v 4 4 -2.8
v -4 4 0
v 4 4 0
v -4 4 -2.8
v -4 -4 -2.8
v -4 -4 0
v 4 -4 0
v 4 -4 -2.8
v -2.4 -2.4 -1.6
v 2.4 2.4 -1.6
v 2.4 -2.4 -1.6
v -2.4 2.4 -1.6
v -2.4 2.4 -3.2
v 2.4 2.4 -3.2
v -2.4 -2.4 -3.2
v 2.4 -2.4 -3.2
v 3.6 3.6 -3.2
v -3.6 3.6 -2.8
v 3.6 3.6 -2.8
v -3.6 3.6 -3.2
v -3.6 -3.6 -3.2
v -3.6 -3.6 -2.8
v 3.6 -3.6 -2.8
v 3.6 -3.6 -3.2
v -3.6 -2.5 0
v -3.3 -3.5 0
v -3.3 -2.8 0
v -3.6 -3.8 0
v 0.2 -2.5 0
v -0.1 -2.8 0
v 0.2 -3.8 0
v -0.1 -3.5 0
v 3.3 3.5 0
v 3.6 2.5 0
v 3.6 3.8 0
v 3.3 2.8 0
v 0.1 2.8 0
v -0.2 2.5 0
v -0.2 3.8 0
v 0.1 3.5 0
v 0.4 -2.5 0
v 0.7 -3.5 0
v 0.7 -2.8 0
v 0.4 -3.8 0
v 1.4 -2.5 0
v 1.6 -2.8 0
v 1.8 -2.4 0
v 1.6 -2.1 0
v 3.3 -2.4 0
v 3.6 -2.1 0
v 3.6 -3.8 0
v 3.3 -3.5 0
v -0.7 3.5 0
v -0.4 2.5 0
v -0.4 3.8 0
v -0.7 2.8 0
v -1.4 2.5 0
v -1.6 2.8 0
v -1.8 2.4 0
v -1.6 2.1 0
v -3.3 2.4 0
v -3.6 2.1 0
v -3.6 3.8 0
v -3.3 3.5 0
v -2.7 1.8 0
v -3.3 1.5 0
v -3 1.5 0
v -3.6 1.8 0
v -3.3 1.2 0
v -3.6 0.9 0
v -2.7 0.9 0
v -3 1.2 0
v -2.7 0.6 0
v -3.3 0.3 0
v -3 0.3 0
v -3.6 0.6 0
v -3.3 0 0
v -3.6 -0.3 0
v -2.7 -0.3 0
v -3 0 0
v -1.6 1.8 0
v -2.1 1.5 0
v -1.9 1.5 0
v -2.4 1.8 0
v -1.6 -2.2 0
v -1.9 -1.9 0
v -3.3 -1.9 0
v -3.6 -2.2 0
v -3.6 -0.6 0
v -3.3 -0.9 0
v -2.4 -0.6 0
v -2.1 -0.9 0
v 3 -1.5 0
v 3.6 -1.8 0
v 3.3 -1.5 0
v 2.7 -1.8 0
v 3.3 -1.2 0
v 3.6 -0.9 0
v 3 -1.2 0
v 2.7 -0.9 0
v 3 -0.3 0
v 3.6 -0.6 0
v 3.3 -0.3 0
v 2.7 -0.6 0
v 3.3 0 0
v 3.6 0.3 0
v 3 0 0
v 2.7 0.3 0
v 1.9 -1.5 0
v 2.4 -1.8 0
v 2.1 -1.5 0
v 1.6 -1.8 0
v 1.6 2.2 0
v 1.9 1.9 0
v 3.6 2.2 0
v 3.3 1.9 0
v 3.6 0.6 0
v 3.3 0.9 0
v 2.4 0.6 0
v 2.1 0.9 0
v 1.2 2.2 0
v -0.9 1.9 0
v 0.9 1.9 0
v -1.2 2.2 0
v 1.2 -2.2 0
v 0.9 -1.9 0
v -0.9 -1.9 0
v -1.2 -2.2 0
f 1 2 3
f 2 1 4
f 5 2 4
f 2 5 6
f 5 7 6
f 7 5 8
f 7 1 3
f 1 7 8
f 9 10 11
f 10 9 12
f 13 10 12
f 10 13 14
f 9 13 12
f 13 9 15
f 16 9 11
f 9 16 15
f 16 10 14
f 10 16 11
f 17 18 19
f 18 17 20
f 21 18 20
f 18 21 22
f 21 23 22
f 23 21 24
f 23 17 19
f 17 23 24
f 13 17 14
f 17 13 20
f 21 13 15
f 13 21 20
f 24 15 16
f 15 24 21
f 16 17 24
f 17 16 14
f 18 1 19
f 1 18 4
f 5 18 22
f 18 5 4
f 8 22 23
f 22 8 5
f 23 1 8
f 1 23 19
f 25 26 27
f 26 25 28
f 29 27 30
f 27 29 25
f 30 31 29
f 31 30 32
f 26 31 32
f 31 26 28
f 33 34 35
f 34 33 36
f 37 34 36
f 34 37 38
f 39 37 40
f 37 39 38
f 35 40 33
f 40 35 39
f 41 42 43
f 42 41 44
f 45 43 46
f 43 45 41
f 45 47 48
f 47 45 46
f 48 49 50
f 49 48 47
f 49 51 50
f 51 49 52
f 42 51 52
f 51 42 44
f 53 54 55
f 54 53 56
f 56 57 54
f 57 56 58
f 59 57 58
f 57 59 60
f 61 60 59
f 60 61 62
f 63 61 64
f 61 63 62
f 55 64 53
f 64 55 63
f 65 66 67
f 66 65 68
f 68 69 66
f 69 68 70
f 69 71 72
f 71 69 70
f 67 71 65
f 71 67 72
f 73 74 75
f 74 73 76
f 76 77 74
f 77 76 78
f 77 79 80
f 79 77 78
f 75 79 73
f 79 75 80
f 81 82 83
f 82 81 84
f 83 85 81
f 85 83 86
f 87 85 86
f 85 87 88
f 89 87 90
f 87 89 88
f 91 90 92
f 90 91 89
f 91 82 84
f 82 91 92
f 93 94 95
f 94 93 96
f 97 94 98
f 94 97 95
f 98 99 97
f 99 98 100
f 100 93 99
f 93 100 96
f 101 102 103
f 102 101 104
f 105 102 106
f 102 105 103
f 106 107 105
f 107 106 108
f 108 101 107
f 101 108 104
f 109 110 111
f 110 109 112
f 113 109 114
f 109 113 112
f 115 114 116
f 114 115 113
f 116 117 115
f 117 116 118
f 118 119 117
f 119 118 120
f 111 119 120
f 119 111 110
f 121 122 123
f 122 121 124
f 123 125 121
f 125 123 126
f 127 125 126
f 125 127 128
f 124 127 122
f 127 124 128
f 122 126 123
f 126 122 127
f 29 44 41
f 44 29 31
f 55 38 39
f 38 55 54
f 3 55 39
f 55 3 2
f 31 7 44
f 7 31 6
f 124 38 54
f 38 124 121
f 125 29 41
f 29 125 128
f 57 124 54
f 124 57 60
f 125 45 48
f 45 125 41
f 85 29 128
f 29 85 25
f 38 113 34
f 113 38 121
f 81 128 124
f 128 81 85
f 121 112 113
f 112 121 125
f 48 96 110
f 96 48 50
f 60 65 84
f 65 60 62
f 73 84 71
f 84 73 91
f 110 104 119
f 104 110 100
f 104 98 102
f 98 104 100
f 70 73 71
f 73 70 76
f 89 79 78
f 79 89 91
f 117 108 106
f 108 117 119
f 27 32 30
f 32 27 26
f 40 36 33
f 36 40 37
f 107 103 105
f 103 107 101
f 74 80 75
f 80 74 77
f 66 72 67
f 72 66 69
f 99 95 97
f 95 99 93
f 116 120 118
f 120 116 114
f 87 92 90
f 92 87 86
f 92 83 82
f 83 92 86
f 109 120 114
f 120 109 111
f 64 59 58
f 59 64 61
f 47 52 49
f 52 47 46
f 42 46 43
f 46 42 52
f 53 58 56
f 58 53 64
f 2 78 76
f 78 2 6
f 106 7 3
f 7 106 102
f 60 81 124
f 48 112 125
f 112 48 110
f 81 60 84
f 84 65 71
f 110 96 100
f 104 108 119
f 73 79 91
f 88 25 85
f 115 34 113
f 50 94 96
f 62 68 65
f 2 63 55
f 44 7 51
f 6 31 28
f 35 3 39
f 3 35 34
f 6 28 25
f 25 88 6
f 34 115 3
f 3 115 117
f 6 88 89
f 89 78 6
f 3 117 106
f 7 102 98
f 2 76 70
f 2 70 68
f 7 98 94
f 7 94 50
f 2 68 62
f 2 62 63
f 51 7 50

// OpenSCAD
// file: ../p/box5.scad
use <../lib.scad>
function ldraw_lib__box5() = [
// 0 Box with 5 Faces and All Edges
// 0 Name: box5.dat
// 0 Author: James Jessiman
// 0 !LDRAW_ORG Primitive UPDATE 2012-01
// 0 !LICENSE Licensed under CC BY 4.0 : see CAreadme.txt
// 
// 0 BFC CERTIFY CCW
  [0,"BFC","CERTIFY"],
  [0,"BFC","CCW"],
// 
// 0 !HISTORY 2002-04-03 [sbliss] Modified for BFC compliance
// 0 !HISTORY 2002-04-25 [PTadmin] Official Update 2002-02
// 0 !HISTORY 2007-06-24 [PTadmin] Header formatted for Contributor Agreement
// 0 !HISTORY 2008-07-01 [PTadmin] Official Update 2008-01
// 0 !HISTORY 2012-02-16 [Philo] Changed to CCW
// 0 !HISTORY 2012-03-30 [PTadmin] Official Update 2012-01
// 
// 
// 2 24 1 1 1 -1 1 1
  [2,24,1,1,1,-1,1,1],
// 2 24 -1 1 1 -1 1 -1
  [2,24,-1,1,1,-1,1,-1],
// 2 24 -1 1 -1 1 1 -1
  [2,24,-1,1,-1,1,1,-1],
// 2 24 1 1 -1 1 1 1
  [2,24,1,1,-1,1,1,1],
// 2 24 1 0 1 -1 0 1
  [2,24,1,0,1,-1,0,1],
// 2 24 -1 0 1 -1 0 -1
  [2,24,-1,0,1,-1,0,-1],
// 2 24 -1 0 -1 1 0 -1
  [2,24,-1,0,-1,1,0,-1],
// 2 24 1 0 -1 1 0 1
  [2,24,1,0,-1,1,0,1],
// 2 24 1 0 1 1 1 1
  [2,24,1,0,1,1,1,1],
// 2 24 -1 0 1 -1 1 1
  [2,24,-1,0,1,-1,1,1],
// 2 24 1 0 -1 1 1 -1
  [2,24,1,0,-1,1,1,-1],
// 2 24 -1 0 -1 -1 1 -1
  [2,24,-1,0,-1,-1,1,-1],
// 4 16 -1 1 1 1 1 1 1 1 -1 -1 1 -1
  [4,16,-1,1,1,1,1,1,1,1,-1,-1,1,-1],
// 4 16 -1 1 1 -1 0 1 1 0 1 1 1 1
  [4,16,-1,1,1,-1,0,1,1,0,1,1,1,1],
// 4 16 -1 1 -1 -1 0 -1 -1 0 1 -1 1 1
  [4,16,-1,1,-1,-1,0,-1,-1,0,1,-1,1,1],
// 4 16 1 1 -1 1 0 -1 -1 0 -1 -1 1 -1
  [4,16,1,1,-1,1,0,-1,-1,0,-1,-1,1,-1],
// 4 16 1 1 1 1 0 1 1 0 -1 1 1 -1
  [4,16,1,1,1,1,0,1,1,0,-1,1,1,-1],
];
module ldraw_lib__box5(step=0, col=false, unit=2/5, alt=false, line=0.2, solid=!$preview)
    makepoly(ldraw_lib__box5(), step=step, col=col, unit=unit, alt=alt, line=line, solid=solid);
ldraw_lib__box5(line=0.2);
// file: ../p/box4.scad
use <../lib.scad>
function ldraw_lib__box4() = [
// 0 Box with 4 Faces (2 Parallel Pairs) and All Edges
// 0 Name: box4.dat
// 0 Author: James Jessiman
// 0 !LDRAW_ORG Primitive UPDATE 2012-01
// 0 !LICENSE Licensed under CC BY 4.0 : see CAreadme.txt
// 
// 0 BFC CERTIFY CCW
  [0,"BFC","CERTIFY"],
  [0,"BFC","CCW"],
// 
// 0 !HISTORY 2002-04-03 [sbliss] Modified for BFC compliance
// 0 !HISTORY 2002-04-25 [PTadmin] Official Update 2002-02
// 0 !HISTORY 2007-06-24 [PTadmin] Header formatted for Contributor Agreement
// 0 !HISTORY 2008-07-01 [PTadmin] Official Update 2008-01
// 0 !HISTORY 2012-02-16 [Philo] Changed to CCW
// 0 !HISTORY 2012-03-30 [PTadmin] Official Update 2012-01
// 
// 
// 2 24 1 1 1 -1 1 1
  [2,24,1,1,1,-1,1,1],
// 2 24 -1 1 1 -1 1 -1
  [2,24,-1,1,1,-1,1,-1],
// 2 24 -1 1 -1 1 1 -1
  [2,24,-1,1,-1,1,1,-1],
// 2 24 1 1 -1 1 1 1
  [2,24,1,1,-1,1,1,1],
// 2 24 1 0 1 -1 0 1
  [2,24,1,0,1,-1,0,1],
// 2 24 -1 0 1 -1 0 -1
  [2,24,-1,0,1,-1,0,-1],
// 2 24 -1 0 -1 1 0 -1
  [2,24,-1,0,-1,1,0,-1],
// 2 24 1 0 -1 1 0 1
  [2,24,1,0,-1,1,0,1],
// 2 24 1 0 1 1 1 1
  [2,24,1,0,1,1,1,1],
// 2 24 -1 0 1 -1 1 1
  [2,24,-1,0,1,-1,1,1],
// 2 24 1 0 -1 1 1 -1
  [2,24,1,0,-1,1,1,-1],
// 2 24 -1 0 -1 -1 1 -1
  [2,24,-1,0,-1,-1,1,-1],
// 4 16 -1 1 1 -1 0 1 1 0 1 1 1 1
  [4,16,-1,1,1,-1,0,1,1,0,1,1,1,1],
// 4 16 -1 1 -1 -1 0 -1 -1 0 1 -1 1 1
  [4,16,-1,1,-1,-1,0,-1,-1,0,1,-1,1,1],
// 4 16 1 1 -1 1 0 -1 -1 0 -1 -1 1 -1
  [4,16,1,1,-1,1,0,-1,-1,0,-1,-1,1,-1],
// 4 16 1 1 1 1 0 1 1 0 -1 1 1 -1
  [4,16,1,1,1,1,0,1,1,0,-1,1,1,-1],
];
module ldraw_lib__box4(step=0, col=false, unit=2/5, alt=false, line=0.2, solid=!$preview)
    makepoly(ldraw_lib__box4(), step=step, col=col, unit=unit, alt=alt, line=line, solid=solid);
ldraw_lib__box4(line=0.2);
// file: s/3070bs01.scad
use <../../lib.scad>
use <../../p/box4.scad>
use <../../p/box5.scad>
function ldraw_lib__s__3070bs01() = [
// 0 ~Tile  1 x  1 with Groove without Top Face
// 0 Name: s\3070bs01.dat
// 0 Author: Chris Dee [cwdee]
// 0 !LDRAW_ORG Subpart UPDATE 2009-02
// 0 !LICENSE Licensed under CC BY 4.0 : see CAreadme.txt
// 
// 0 BFC CERTIFY CCW
  [0,"BFC","CERTIFY"],
  [0,"BFC","CCW"],
// 
// 0 !HISTORY 2009-09-03 [PTadmin] Official Update 2009-02
// 
// 
// 1 16 0 0 0 10 0 0 0 7 0 0 0 10 box4.dat
  [1,16,0,0,0,10,0,0,0,7,0,0,0,10, ldraw_lib__box4()],
// 0 BFC INVERTNEXT
  [0,"BFC","INVERTNEXT"],
// 1 16 0 8 0 6 0 0 0 -4 0 0 0 6 box5.dat
  [1,16,0,8,0,6,0,0,0,-4,0,0,0,6, ldraw_lib__box5()],
// 1 16 0 7 0 9 0 0 0 1 0 0 0 9 box4.dat
  [1,16,0,7,0,9,0,0,0,1,0,0,0,9, ldraw_lib__box4()],
// 
// 4 16 9 8 9 6 8 6 -6 8 6 -9 8 9
  [4,16,9,8,9,6,8,6,-6,8,6,-9,8,9],
// 4 16 -9 8 9 -6 8 6 -6 8 -6 -9 8 -9
  [4,16,-9,8,9,-6,8,6,-6,8,-6,-9,8,-9],
// 4 16 -9 8 -9 -6 8 -6 6 8 -6 9 8 -9
  [4,16,-9,8,-9,-6,8,-6,6,8,-6,9,8,-9],
// 4 16 9 8 -9 6 8 -6 6 8 6 9 8 9
  [4,16,9,8,-9,6,8,-6,6,8,6,9,8,9],
// 
// 4 16 10 7 10 9 7 9 -9 7 9 -10 7 10
  [4,16,10,7,10,9,7,9,-9,7,9,-10,7,10],
// 4 16 -10 7 10 -9 7 9 -9 7 -9 -10 7 -10
  [4,16,-10,7,10,-9,7,9,-9,7,-9,-10,7,-10],
// 4 16 -10 7 -10 -9 7 -9 9 7 -9 10 7 -10
  [4,16,-10,7,-10,-9,7,-9,9,7,-9,10,7,-10],
// 4 16 10 7 -10 9 7 -9 9 7 9 10 7 10
  [4,16,10,7,-10,9,7,-9,9,7,9,10,7,10],
// 0
];
module ldraw_lib__s__3070bs01(step=0, col=false, unit=2/5, alt=false, line=0.2, solid=!$preview)
    makepoly(ldraw_lib__s__3070bs01(), step=step, col=col, unit=unit, alt=alt, line=line, solid=solid);
ldraw_lib__s__3070bs01(line=0.2);
// main file
use <../lib.scad>
use <s/3070bs01.scad>
function ldraw_lib__3070bpz1() = [
// 0 Tile  1 x  1 with Metallic Silver Circuitry Pattern
// 0 Name: 3070bpz1.dat
// 0 Author: Vincent Messenet [Cheenzo]
// 0 !LDRAW_ORG Part UPDATE 2019-02
// 0 !LICENSE Licensed under CC BY 4.0 : see CAreadme.txt
// 
// 0 BFC CERTIFY CCW
  [0,"BFC","CERTIFY"],
  [0,"BFC","CCW"],
// 
// 0 !KEYWORDS Brickheadz, BrickLink 3070pb123, Kylo Ren, Rebrickable 3070bpr0103
// 0 !KEYWORDS Set 41603, Star Wars
// 
// 0 !HISTORY 2019-09-09 [PTadmin] Official Update 2019-02
// 
// 
// 1 16 0 0 0 1 0 0 0 1 0 0 0 1 s\3070bs01.dat
  [1,16,0,0,0,1,0,0,0,1,0,0,0,1, ldraw_lib__s__3070bs01()],
// 
// 4 80 -8.25 0 -8.75 -8.25 0 -7 -9 0 -6.25 -9 0 -9.5
  [4,80,-8.25,0,-8.75,-8.25,0,-7,-9,0,-6.25,-9,0,-9.5],
// 4 80 -.25 0 -7 .5 0 -6.25 -9 0 -6.25 -8.25 0 -7
  [4,80,-.25,0,-7,.5,0,-6.25,-9,0,-6.25,-8.25,0,-7],
// 4 80 -.25 0 -8.75 .5 0 -9.5 .5 0 -6.25 -.25 0 -7
  [4,80,-.25,0,-8.75,.5,0,-9.5,.5,0,-6.25,-.25,0,-7],
// 4 80 .5 0 -9.5 -.25 0 -8.75 -8.25 0 -8.75 -9 0 -9.5
  [4,80,.5,0,-9.5,-.25,0,-8.75,-8.25,0,-8.75,-9,0,-9.5],
// 
// 4 80 8.25 0 8.75 8.25 0 7 9 0 6.25 9 0 9.5
  [4,80,8.25,0,8.75,8.25,0,7,9,0,6.25,9,0,9.5],
// 4 80 .25 0 7 -.5 0 6.25 9 0 6.25 8.25 0 7
  [4,80,.25,0,7,-.5,0,6.25,9,0,6.25,8.25,0,7],
// 4 80 .25 0 8.75 -.5 0 9.5 -.5 0 6.25 .25 0 7
  [4,80,.25,0,8.75,-.5,0,9.5,-.5,0,6.25,.25,0,7],
// 4 80 -.5 0 9.5 .25 0 8.75 8.25 0 8.75 9 0 9.5
  [4,80,-.5,0,9.5,.25,0,8.75,8.25,0,8.75,9,0,9.5],
// 
// 4 80 1 0 -9.5 1.75 0 -8.75 1.75 0 -7 1 0 -6.25
  [4,80,1,0,-9.5,1.75,0,-8.75,1.75,0,-7,1,0,-6.25],
// 4 80 4 0 -7 3.5 0 -6.25 1 0 -6.25 1.75 0 -7
  [4,80,4,0,-7,3.5,0,-6.25,1,0,-6.25,1.75,0,-7],
// 4 80 3.5 0 -6.25 4 0 -7 4.5 0 -6 4 0 -5.25
  [4,80,3.5,0,-6.25,4,0,-7,4.5,0,-6,4,0,-5.25],
// 4 80 4 0 -5.25 4.5 0 -6 8.25 0 -6 9 0 -5.25
  [4,80,4,0,-5.25,4.5,0,-6,8.25,0,-6,9,0,-5.25],
// 4 80 8.25 0 -8.75 9 0 -9.5 9 0 -5.25 8.25 0 -6
  [4,80,8.25,0,-8.75,9,0,-9.5,9,0,-5.25,8.25,0,-6],
// 4 80 9 0 -9.5 8.25 0 -8.75 1.75 0 -8.75 1 0 -9.5
  [4,80,9,0,-9.5,8.25,0,-8.75,1.75,0,-8.75,1,0,-9.5],
// 
// 4 80 -1 0 9.5 -1.75 0 8.75 -1.75 0 7 -1 0 6.25
  [4,80,-1,0,9.5,-1.75,0,8.75,-1.75,0,7,-1,0,6.25],
// 4 80 -4 0 7 -3.5 0 6.25 -1 0 6.25 -1.75 0 7
  [4,80,-4,0,7,-3.5,0,6.25,-1,0,6.25,-1.75,0,7],
// 4 80 -3.5 0 6.25 -4 0 7 -4.5 0 6 -4 0 5.25
  [4,80,-3.5,0,6.25,-4,0,7,-4.5,0,6,-4,0,5.25],
// 4 80 -4 0 5.25 -4.5 0 6 -8.25 0 6 -9 0 5.25
  [4,80,-4,0,5.25,-4.5,0,6,-8.25,0,6,-9,0,5.25],
// 4 80 -8.25 0 8.75 -9 0 9.5 -9 0 5.25 -8.25 0 6
  [4,80,-8.25,0,8.75,-9,0,9.5,-9,0,5.25,-8.25,0,6],
// 4 80 -9 0 9.5 -8.25 0 8.75 -1.75 0 8.75 -1 0 9.5
  [4,80,-9,0,9.5,-8.25,0,8.75,-1.75,0,8.75,-1,0,9.5],
// 
// 4 80 -9 0 4.5 -8.25 0 3.75 -7.5 0 3.75 -6.75 0 4.5
  [4,80,-9,0,4.5,-8.25,0,3.75,-7.5,0,3.75,-6.75,0,4.5],
// 4 80 -8.25 0 3 -8.25 0 3.75 -9 0 4.5 -9 0 2.25
  [4,80,-8.25,0,3,-8.25,0,3.75,-9,0,4.5,-9,0,2.25],
// 4 80 -7.5 0 3 -8.25 0 3 -9 0 2.25 -6.75 0 2.25
  [4,80,-7.5,0,3,-8.25,0,3,-9,0,2.25,-6.75,0,2.25],
// 4 80 -7.5 0 3.75 -7.5 0 3 -6.75 0 2.25 -6.75 0 4.5
  [4,80,-7.5,0,3.75,-7.5,0,3,-6.75,0,2.25,-6.75,0,4.5],
// 
// 4 80 -9 0 1.5 -8.25 0 .75 -7.5 0 .75 -6.75 0 1.5
  [4,80,-9,0,1.5,-8.25,0,.75,-7.5,0,.75,-6.75,0,1.5],
// 4 80 -8.25 0 0 -8.25 0 .75 -9 0 1.5 -9 0 -.75
  [4,80,-8.25,0,0,-8.25,0,.75,-9,0,1.5,-9,0,-.75],
// 4 80 -7.5 0 0 -8.25 0 0 -9 0 -.75 -6.75 0 -.75
  [4,80,-7.5,0,0,-8.25,0,0,-9,0,-.75,-6.75,0,-.75],
// 4 80 -7.5 0 .75 -7.5 0 0 -6.75 0 -.75 -6.75 0 1.5
  [4,80,-7.5,0,.75,-7.5,0,0,-6.75,0,-.75,-6.75,0,1.5],
// 
// 4 80 -6 0 4.5 -5.25 0 3.75 -4.75 0 3.75 -4 0 4.5
  [4,80,-6,0,4.5,-5.25,0,3.75,-4.75,0,3.75,-4,0,4.5],
// 4 80 -4 0 4.5 -4.75 0 3.75 -4.75 0 -4.75 -4 0 -5.5
  [4,80,-4,0,4.5,-4.75,0,3.75,-4.75,0,-4.75,-4,0,-5.5],
// 4 80 -4 0 -5.5 -4.75 0 -4.75 -8.25 0 -4.75 -9 0 -5.5
  [4,80,-4,0,-5.5,-4.75,0,-4.75,-8.25,0,-4.75,-9,0,-5.5],
// 4 80 -9 0 -5.5 -8.25 0 -4.75 -8.25 0 -2.25 -9 0 -1.5
  [4,80,-9,0,-5.5,-8.25,0,-4.75,-8.25,0,-2.25,-9,0,-1.5],
// 4 80 -5.25 0 -2.25 -6 0 -1.5 -9 0 -1.5 -8.25 0 -2.25
  [4,80,-5.25,0,-2.25,-6,0,-1.5,-9,0,-1.5,-8.25,0,-2.25],
// 4 80 -6 0 4.5 -6 0 -1.5 -5.25 0 -2.25 -5.25 0 3.75
  [4,80,-6,0,4.5,-6,0,-1.5,-5.25,0,-2.25,-5.25,0,3.75],
// 
// 4 80 9 0 -4.5 8.25 0 -3.75 7.5 0 -3.75 6.75 0 -4.5
  [4,80,9,0,-4.5,8.25,0,-3.75,7.5,0,-3.75,6.75,0,-4.5],
// 4 80 8.25 0 -3 8.25 0 -3.75 9 0 -4.5 9 0 -2.25
  [4,80,8.25,0,-3,8.25,0,-3.75,9,0,-4.5,9,0,-2.25],
// 4 80 7.5 0 -3 8.25 0 -3 9 0 -2.25 6.75 0 -2.25
  [4,80,7.5,0,-3,8.25,0,-3,9,0,-2.25,6.75,0,-2.25],
// 4 80 7.5 0 -3.75 7.5 0 -3 6.75 0 -2.25 6.75 0 -4.5
  [4,80,7.5,0,-3.75,7.5,0,-3,6.75,0,-2.25,6.75,0,-4.5],
// 
// 4 80 9 0 -1.5 8.25 0 -.75 7.5 0 -.75 6.75 0 -1.5
  [4,80,9,0,-1.5,8.25,0,-.75,7.5,0,-.75,6.75,0,-1.5],
// 4 80 8.25 0 0 8.25 0 -.75 9 0 -1.5 9 0 .75
  [4,80,8.25,0,0,8.25,0,-.75,9,0,-1.5,9,0,.75],
// 4 80 7.5 0 0 8.25 0 0 9 0 .75 6.75 0 .75
  [4,80,7.5,0,0,8.25,0,0,9,0,.75,6.75,0,.75],
// 4 80 7.5 0 -.75 7.5 0 0 6.75 0 .75 6.75 0 -1.5
  [4,80,7.5,0,-.75,7.5,0,0,6.75,0,.75,6.75,0,-1.5],
// 
// 4 80 6 0 -4.5 5.25 0 -3.75 4.75 0 -3.75 4 0 -4.5
  [4,80,6,0,-4.5,5.25,0,-3.75,4.75,0,-3.75,4,0,-4.5],
// 4 80 4 0 -4.5 4.75 0 -3.75 4.75 0 4.75 4 0 5.5
  [4,80,4,0,-4.5,4.75,0,-3.75,4.75,0,4.75,4,0,5.5],
// 4 80 4 0 5.5 4.75 0 4.75 8.25 0 4.75 9 0 5.5
  [4,80,4,0,5.5,4.75,0,4.75,8.25,0,4.75,9,0,5.5],
// 4 80 9 0 5.5 8.25 0 4.75 8.25 0 2.25 9 0 1.5
  [4,80,9,0,5.5,8.25,0,4.75,8.25,0,2.25,9,0,1.5],
// 4 80 5.25 0 2.25 6 0 1.5 9 0 1.5 8.25 0 2.25
  [4,80,5.25,0,2.25,6,0,1.5,9,0,1.5,8.25,0,2.25],
// 4 80 6 0 -4.5 6 0 1.5 5.25 0 2.25 5.25 0 -3.75
  [4,80,6,0,-4.5,6,0,1.5,5.25,0,2.25,5.25,0,-3.75],
// 
// 4 80 -3 0 5.5 -2.25 0 4.75 2.25 0 4.75 3 0 5.5
  [4,80,-3,0,5.5,-2.25,0,4.75,2.25,0,4.75,3,0,5.5],
// 4 80 3 0 5.5 2.25 0 4.75 2.25 0 -4.75 3 0 -5.5
  [4,80,3,0,5.5,2.25,0,4.75,2.25,0,-4.75,3,0,-5.5],
// 4 80 -2.25 0 -4.75 -3 0 -5.5 3 0 -5.5 2.25 0 -4.75
  [4,80,-2.25,0,-4.75,-3,0,-5.5,3,0,-5.5,2.25,0,-4.75],
// 4 80 -3 0 -5.5 -2.25 0 -4.75 -2.25 0 4.75 -3 0 5.5
  [4,80,-3,0,-5.5,-2.25,0,-4.75,-2.25,0,4.75,-3,0,5.5],
// 
// 4 16 2.25 0 -4.75 2.25 0 4.75 -2.25 0 4.75 -2.25 0 -4.75
  [4,16,2.25,0,-4.75,2.25,0,4.75,-2.25,0,4.75,-2.25,0,-4.75],
// 4 16 .5 0 -9.5 1 0 -9.5 1 0 -6.25 .5 0 -6.25
  [4,16,.5,0,-9.5,1,0,-9.5,1,0,-6.25,.5,0,-6.25],
// 4 16 -.5 0 6.25 -.5 0 9.5 -1 0 9.5 -1 0 6.25
  [4,16,-.5,0,6.25,-.5,0,9.5,-1,0,9.5,-1,0,6.25],
// 4 16 10 0 10 -10 0 10 -1 0 9.5 -.5 0 9.5
  [4,16,10,0,10,-10,0,10,-1,0,9.5,-.5,0,9.5],
// 4 16 -10 0 -10 10 0 -10 1 0 -9.5 .5 0 -9.5
  [4,16,-10,0,-10,10,0,-10,1,0,-9.5,.5,0,-9.5],
// 4 16 -.5 0 6.25 -1 0 6.25 -3 0 5.5 3 0 5.5
  [4,16,-.5,0,6.25,-1,0,6.25,-3,0,5.5,3,0,5.5],
// 4 16 -3 0 -5.5 .5 0 -6.25 1 0 -6.25 3 0 -5.5
  [4,16,-3,0,-5.5,.5,0,-6.25,1,0,-6.25,3,0,-5.5],
// 4 16 -3 0 5.5 -1 0 6.25 -3.5 0 6.25 -4 0 5.25
  [4,16,-3,0,5.5,-1,0,6.25,-3.5,0,6.25,-4,0,5.25],
// 4 16 1 0 -6.25 3.5 0 -6.25 4 0 -5.25 3 0 -5.5
  [4,16,1,0,-6.25,3.5,0,-6.25,4,0,-5.25,3,0,-5.5],
// 4 16 -3 0 -5.5 -4 0 -5.5 -9 0 -6.25 .5 0 -6.25
  [4,16,-3,0,-5.5,-4,0,-5.5,-9,0,-6.25,.5,0,-6.25],
// 4 16 -.5 0 6.25 3 0 5.5 4 0 5.5 9 0 6.25
  [4,16,-.5,0,6.25,3,0,5.5,4,0,5.5,9,0,6.25],
// 4 16 -3 0 5.5 -4 0 4.5 -4 0 -5.5 -3 0 -5.5
  [4,16,-3,0,5.5,-4,0,4.5,-4,0,-5.5,-3,0,-5.5],
// 4 16 4 0 -4.5 4 0 5.5 3 0 5.5 3 0 -5.5
  [4,16,4,0,-4.5,4,0,5.5,3,0,5.5,3,0,-5.5],
// 4 16 6.75 0 -4.5 6 0 -4.5 4 0 -5.25 9 0 -5.25
  [4,16,6.75,0,-4.5,6,0,-4.5,4,0,-5.25,9,0,-5.25],
// 4 16 -6.75 0 4.5 -6 0 4.5 -4 0 5.25 -9 0 5.25
  [4,16,-6.75,0,4.5,-6,0,4.5,-4,0,5.25,-9,0,5.25],
// 4 16 -6 0 4.5 -6.75 0 2.25 -6.75 0 1.5 -6 0 -1.5
  [4,16,-6,0,4.5,-6.75,0,2.25,-6.75,0,1.5,-6,0,-1.5],
// 4 16 6.75 0 -2.25 6.75 0 -1.5 6 0 1.5 6 0 -4.5
  [4,16,6.75,0,-2.25,6.75,0,-1.5,6,0,1.5,6,0,-4.5],
// 4 16 6.75 0 -1.5 6.75 0 -2.25 9 0 -2.25 9 0 -1.5
  [4,16,6.75,0,-1.5,6.75,0,-2.25,9,0,-2.25,9,0,-1.5],
// 4 16 -9 0 2.25 -9 0 1.5 -6.75 0 1.5 -6.75 0 2.25
  [4,16,-9,0,2.25,-9,0,1.5,-6.75,0,1.5,-6.75,0,2.25],
// 4 16 -9 0 -.75 -9 0 -1.5 -6 0 -1.5 -6.75 0 -.75
  [4,16,-9,0,-.75,-9,0,-1.5,-6,0,-1.5,-6.75,0,-.75],
// 4 16 6.75 0 .75 9 0 .75 9 0 1.5 6 0 1.5
  [4,16,6.75,0,.75,9,0,.75,9,0,1.5,6,0,1.5],
// 4 16 -8.25 0 -8.75 -.25 0 -8.75 -.25 0 -7 -8.25 0 -7
  [4,16,-8.25,0,-8.75,-.25,0,-8.75,-.25,0,-7,-8.25,0,-7],
// 4 16 .25 0 8.75 .25 0 7 8.25 0 7 8.25 0 8.75
  [4,16,.25,0,8.75,.25,0,7,8.25,0,7,8.25,0,8.75],
// 4 16 7.5 0 0 7.5 0 -.75 8.25 0 -.75 8.25 0 0
  [4,16,7.5,0,0,7.5,0,-.75,8.25,0,-.75,8.25,0,0],
// 4 16 -8.25 0 .75 -8.25 0 0 -7.5 0 0 -7.5 0 .75
  [4,16,-8.25,0,.75,-8.25,0,0,-7.5,0,0,-7.5,0,.75],
// 4 16 -8.25 0 3 -7.5 0 3 -7.5 0 3.75 -8.25 0 3.75
  [4,16,-8.25,0,3,-7.5,0,3,-7.5,0,3.75,-8.25,0,3.75],
// 4 16 8.25 0 -3.75 8.25 0 -3 7.5 0 -3 7.5 0 -3.75
  [4,16,8.25,0,-3.75,8.25,0,-3,7.5,0,-3,7.5,0,-3.75],
// 4 16 5.25 0 2.25 8.25 0 2.25 8.25 0 4.75 4.75 0 4.75
  [4,16,5.25,0,2.25,8.25,0,2.25,8.25,0,4.75,4.75,0,4.75],
// 4 16 -8.25 0 -2.25 -8.25 0 -4.75 -4.75 0 -4.75 -5.25 0 -2.25
  [4,16,-8.25,0,-2.25,-8.25,0,-4.75,-4.75,0,-4.75,-5.25,0,-2.25],
// 4 16 -4.75 0 3.75 -5.25 0 3.75 -5.25 0 -2.25 -4.75 0 -4.75
  [4,16,-4.75,0,3.75,-5.25,0,3.75,-5.25,0,-2.25,-4.75,0,-4.75],
// 4 16 5.25 0 -3.75 5.25 0 2.25 4.75 0 4.75 4.75 0 -3.75
  [4,16,5.25,0,-3.75,5.25,0,2.25,4.75,0,4.75,4.75,0,-3.75],
// 4 16 -8.25 0 8.75 -8.25 0 6 -4.5 0 6 -4 0 7
  [4,16,-8.25,0,8.75,-8.25,0,6,-4.5,0,6,-4,0,7],
// 4 16 8.25 0 -8.75 8.25 0 -6 4.5 0 -6 4 0 -7
  [4,16,8.25,0,-8.75,8.25,0,-6,4.5,0,-6,4,0,-7],
// 4 16 1.75 0 -7 1.75 0 -8.75 8.25 0 -8.75 4 0 -7
  [4,16,1.75,0,-7,1.75,0,-8.75,8.25,0,-8.75,4,0,-7],
// 4 16 -1.75 0 7 -1.75 0 8.75 -8.25 0 8.75 -4 0 7
  [4,16,-1.75,0,7,-1.75,0,8.75,-8.25,0,8.75,-4,0,7],
// 4 16 -9 0 -.75 -9 0 1.5 -10 0 10 -10 0 -10
  [4,16,-9,0,-.75,-9,0,1.5,-10,0,10,-10,0,-10],
// 4 16 9 0 -1.5 10 0 -10 10 0 10 9 0 .75
  [4,16,9,0,-1.5,10,0,-10,10,0,10,9,0,.75],
// 3 16 -4 0 5.25 -4 0 4.5 -3 0 5.5
  [3,16,-4,0,5.25,-4,0,4.5,-3,0,5.5],
// 3 16 4 0 -5.25 4 0 -4.5 3 0 -5.5
  [3,16,4,0,-5.25,4,0,-4.5,3,0,-5.5],
// 3 16 4 0 -4.5 4 0 -5.25 6 0 -4.5
  [3,16,4,0,-4.5,4,0,-5.25,6,0,-4.5],
// 3 16 -4 0 4.5 -4 0 5.25 -6 0 4.5
  [3,16,-4,0,4.5,-4,0,5.25,-6,0,4.5],
// 3 16 -6 0 4.5 -6.75 0 4.5 -6.75 0 2.25
  [3,16,-6,0,4.5,-6.75,0,4.5,-6.75,0,2.25],
// 3 16 6 0 -4.5 6.75 0 -4.5 6.75 0 -2.25
  [3,16,6,0,-4.5,6.75,0,-4.5,6.75,0,-2.25],
// 3 16 6.75 0 -1.5 6.75 0 .75 6 0 1.5
  [3,16,6.75,0,-1.5,6.75,0,.75,6,0,1.5],
// 3 16 -6.75 0 1.5 -6.75 0 -.75 -6 0 -1.5
  [3,16,-6.75,0,1.5,-6.75,0,-.75,-6,0,-1.5],
// 3 16 -9 0 -5.5 -9 0 -6.25 -4 0 -5.5
  [3,16,-9,0,-5.5,-9,0,-6.25,-4,0,-5.5],
// 3 16 9 0 5.5 9 0 6.25 4 0 5.5
  [3,16,9,0,5.5,9,0,6.25,4,0,5.5],
// 3 16 9 0 -5.25 9 0 -4.5 6.75 0 -4.5
  [3,16,9,0,-5.25,9,0,-4.5,6.75,0,-4.5],
// 3 16 -9 0 5.25 -9 0 4.5 -6.75 0 4.5
  [3,16,-9,0,5.25,-9,0,4.5,-6.75,0,4.5],
// 3 16 -10 0 10 -9 0 9.5 -1 0 9.5
  [3,16,-10,0,10,-9,0,9.5,-1,0,9.5],
// 3 16 1 0 -9.5 10 0 -10 9 0 -9.5
  [3,16,1,0,-9.5,10,0,-10,9,0,-9.5],
// 3 16 -10 0 -10 .5 0 -9.5 -9 0 -9.5
  [3,16,-10,0,-10,.5,0,-9.5,-9,0,-9.5],
// 3 16 9 0 9.5 10 0 10 -.5 0 9.5
  [3,16,9,0,9.5,10,0,10,-.5,0,9.5],
// 3 16 10 0 10 9 0 9.5 9 0 6.25
  [3,16,10,0,10,9,0,9.5,9,0,6.25],
// 3 16 -10 0 -10 -9 0 -9.5 -9 0 -6.25
  [3,16,-10,0,-10,-9,0,-9.5,-9,0,-6.25],
// 3 16 -9 0 -6.25 -9 0 -5.5 -10 0 -10
  [3,16,-9,0,-6.25,-9,0,-5.5,-10,0,-10],
// 3 16 9 0 6.25 9 0 5.5 10 0 10
  [3,16,9,0,6.25,9,0,5.5,10,0,10],
// 3 16 10 0 10 9 0 5.5 9 0 1.5
  [3,16,10,0,10,9,0,5.5,9,0,1.5],
// 3 16 -10 0 -10 -9 0 -5.5 -9 0 -1.5
  [3,16,-10,0,-10,-9,0,-5.5,-9,0,-1.5],
// 3 16 -9 0 -1.5 -9 0 -.75 -10 0 -10
  [3,16,-9,0,-1.5,-9,0,-.75,-10,0,-10],
// 3 16 10 0 10 9 0 1.5 9 0 .75
  [3,16,10,0,10,9,0,1.5,9,0,.75],
// 3 16 10 0 -10 9 0 -1.5 9 0 -2.25
  [3,16,10,0,-10,9,0,-1.5,9,0,-2.25],
// 3 16 -10 0 10 -9 0 1.5 -9 0 2.25
  [3,16,-10,0,10,-9,0,1.5,-9,0,2.25],
// 3 16 -10 0 10 -9 0 2.25 -9 0 4.5
  [3,16,-10,0,10,-9,0,2.25,-9,0,4.5],
// 3 16 10 0 -10 9 0 -2.25 9 0 -4.5
  [3,16,10,0,-10,9,0,-2.25,9,0,-4.5],
// 3 16 10 0 -10 9 0 -4.5 9 0 -5.25
  [3,16,10,0,-10,9,0,-4.5,9,0,-5.25],
// 3 16 -10 0 10 -9 0 4.5 -9 0 5.25
  [3,16,-10,0,10,-9,0,4.5,-9,0,5.25],
// 3 16 -10 0 10 -9 0 5.25 -9 0 9.5
  [3,16,-10,0,10,-9,0,5.25,-9,0,9.5],
// 3 16 9 0 -9.5 10 0 -10 9 0 -5.25
  [3,16,9,0,-9.5,10,0,-10,9,0,-5.25],
];
module ldraw_lib__3070bpz1(step=0, col=false, unit=2/5, alt=false, line=0.2, solid=!$preview)
    makepoly(ldraw_lib__3070bpz1(), step=step, col=col, unit=unit, alt=alt, line=line, solid=solid);
ldraw_lib__3070bpz1(line=0.2);
